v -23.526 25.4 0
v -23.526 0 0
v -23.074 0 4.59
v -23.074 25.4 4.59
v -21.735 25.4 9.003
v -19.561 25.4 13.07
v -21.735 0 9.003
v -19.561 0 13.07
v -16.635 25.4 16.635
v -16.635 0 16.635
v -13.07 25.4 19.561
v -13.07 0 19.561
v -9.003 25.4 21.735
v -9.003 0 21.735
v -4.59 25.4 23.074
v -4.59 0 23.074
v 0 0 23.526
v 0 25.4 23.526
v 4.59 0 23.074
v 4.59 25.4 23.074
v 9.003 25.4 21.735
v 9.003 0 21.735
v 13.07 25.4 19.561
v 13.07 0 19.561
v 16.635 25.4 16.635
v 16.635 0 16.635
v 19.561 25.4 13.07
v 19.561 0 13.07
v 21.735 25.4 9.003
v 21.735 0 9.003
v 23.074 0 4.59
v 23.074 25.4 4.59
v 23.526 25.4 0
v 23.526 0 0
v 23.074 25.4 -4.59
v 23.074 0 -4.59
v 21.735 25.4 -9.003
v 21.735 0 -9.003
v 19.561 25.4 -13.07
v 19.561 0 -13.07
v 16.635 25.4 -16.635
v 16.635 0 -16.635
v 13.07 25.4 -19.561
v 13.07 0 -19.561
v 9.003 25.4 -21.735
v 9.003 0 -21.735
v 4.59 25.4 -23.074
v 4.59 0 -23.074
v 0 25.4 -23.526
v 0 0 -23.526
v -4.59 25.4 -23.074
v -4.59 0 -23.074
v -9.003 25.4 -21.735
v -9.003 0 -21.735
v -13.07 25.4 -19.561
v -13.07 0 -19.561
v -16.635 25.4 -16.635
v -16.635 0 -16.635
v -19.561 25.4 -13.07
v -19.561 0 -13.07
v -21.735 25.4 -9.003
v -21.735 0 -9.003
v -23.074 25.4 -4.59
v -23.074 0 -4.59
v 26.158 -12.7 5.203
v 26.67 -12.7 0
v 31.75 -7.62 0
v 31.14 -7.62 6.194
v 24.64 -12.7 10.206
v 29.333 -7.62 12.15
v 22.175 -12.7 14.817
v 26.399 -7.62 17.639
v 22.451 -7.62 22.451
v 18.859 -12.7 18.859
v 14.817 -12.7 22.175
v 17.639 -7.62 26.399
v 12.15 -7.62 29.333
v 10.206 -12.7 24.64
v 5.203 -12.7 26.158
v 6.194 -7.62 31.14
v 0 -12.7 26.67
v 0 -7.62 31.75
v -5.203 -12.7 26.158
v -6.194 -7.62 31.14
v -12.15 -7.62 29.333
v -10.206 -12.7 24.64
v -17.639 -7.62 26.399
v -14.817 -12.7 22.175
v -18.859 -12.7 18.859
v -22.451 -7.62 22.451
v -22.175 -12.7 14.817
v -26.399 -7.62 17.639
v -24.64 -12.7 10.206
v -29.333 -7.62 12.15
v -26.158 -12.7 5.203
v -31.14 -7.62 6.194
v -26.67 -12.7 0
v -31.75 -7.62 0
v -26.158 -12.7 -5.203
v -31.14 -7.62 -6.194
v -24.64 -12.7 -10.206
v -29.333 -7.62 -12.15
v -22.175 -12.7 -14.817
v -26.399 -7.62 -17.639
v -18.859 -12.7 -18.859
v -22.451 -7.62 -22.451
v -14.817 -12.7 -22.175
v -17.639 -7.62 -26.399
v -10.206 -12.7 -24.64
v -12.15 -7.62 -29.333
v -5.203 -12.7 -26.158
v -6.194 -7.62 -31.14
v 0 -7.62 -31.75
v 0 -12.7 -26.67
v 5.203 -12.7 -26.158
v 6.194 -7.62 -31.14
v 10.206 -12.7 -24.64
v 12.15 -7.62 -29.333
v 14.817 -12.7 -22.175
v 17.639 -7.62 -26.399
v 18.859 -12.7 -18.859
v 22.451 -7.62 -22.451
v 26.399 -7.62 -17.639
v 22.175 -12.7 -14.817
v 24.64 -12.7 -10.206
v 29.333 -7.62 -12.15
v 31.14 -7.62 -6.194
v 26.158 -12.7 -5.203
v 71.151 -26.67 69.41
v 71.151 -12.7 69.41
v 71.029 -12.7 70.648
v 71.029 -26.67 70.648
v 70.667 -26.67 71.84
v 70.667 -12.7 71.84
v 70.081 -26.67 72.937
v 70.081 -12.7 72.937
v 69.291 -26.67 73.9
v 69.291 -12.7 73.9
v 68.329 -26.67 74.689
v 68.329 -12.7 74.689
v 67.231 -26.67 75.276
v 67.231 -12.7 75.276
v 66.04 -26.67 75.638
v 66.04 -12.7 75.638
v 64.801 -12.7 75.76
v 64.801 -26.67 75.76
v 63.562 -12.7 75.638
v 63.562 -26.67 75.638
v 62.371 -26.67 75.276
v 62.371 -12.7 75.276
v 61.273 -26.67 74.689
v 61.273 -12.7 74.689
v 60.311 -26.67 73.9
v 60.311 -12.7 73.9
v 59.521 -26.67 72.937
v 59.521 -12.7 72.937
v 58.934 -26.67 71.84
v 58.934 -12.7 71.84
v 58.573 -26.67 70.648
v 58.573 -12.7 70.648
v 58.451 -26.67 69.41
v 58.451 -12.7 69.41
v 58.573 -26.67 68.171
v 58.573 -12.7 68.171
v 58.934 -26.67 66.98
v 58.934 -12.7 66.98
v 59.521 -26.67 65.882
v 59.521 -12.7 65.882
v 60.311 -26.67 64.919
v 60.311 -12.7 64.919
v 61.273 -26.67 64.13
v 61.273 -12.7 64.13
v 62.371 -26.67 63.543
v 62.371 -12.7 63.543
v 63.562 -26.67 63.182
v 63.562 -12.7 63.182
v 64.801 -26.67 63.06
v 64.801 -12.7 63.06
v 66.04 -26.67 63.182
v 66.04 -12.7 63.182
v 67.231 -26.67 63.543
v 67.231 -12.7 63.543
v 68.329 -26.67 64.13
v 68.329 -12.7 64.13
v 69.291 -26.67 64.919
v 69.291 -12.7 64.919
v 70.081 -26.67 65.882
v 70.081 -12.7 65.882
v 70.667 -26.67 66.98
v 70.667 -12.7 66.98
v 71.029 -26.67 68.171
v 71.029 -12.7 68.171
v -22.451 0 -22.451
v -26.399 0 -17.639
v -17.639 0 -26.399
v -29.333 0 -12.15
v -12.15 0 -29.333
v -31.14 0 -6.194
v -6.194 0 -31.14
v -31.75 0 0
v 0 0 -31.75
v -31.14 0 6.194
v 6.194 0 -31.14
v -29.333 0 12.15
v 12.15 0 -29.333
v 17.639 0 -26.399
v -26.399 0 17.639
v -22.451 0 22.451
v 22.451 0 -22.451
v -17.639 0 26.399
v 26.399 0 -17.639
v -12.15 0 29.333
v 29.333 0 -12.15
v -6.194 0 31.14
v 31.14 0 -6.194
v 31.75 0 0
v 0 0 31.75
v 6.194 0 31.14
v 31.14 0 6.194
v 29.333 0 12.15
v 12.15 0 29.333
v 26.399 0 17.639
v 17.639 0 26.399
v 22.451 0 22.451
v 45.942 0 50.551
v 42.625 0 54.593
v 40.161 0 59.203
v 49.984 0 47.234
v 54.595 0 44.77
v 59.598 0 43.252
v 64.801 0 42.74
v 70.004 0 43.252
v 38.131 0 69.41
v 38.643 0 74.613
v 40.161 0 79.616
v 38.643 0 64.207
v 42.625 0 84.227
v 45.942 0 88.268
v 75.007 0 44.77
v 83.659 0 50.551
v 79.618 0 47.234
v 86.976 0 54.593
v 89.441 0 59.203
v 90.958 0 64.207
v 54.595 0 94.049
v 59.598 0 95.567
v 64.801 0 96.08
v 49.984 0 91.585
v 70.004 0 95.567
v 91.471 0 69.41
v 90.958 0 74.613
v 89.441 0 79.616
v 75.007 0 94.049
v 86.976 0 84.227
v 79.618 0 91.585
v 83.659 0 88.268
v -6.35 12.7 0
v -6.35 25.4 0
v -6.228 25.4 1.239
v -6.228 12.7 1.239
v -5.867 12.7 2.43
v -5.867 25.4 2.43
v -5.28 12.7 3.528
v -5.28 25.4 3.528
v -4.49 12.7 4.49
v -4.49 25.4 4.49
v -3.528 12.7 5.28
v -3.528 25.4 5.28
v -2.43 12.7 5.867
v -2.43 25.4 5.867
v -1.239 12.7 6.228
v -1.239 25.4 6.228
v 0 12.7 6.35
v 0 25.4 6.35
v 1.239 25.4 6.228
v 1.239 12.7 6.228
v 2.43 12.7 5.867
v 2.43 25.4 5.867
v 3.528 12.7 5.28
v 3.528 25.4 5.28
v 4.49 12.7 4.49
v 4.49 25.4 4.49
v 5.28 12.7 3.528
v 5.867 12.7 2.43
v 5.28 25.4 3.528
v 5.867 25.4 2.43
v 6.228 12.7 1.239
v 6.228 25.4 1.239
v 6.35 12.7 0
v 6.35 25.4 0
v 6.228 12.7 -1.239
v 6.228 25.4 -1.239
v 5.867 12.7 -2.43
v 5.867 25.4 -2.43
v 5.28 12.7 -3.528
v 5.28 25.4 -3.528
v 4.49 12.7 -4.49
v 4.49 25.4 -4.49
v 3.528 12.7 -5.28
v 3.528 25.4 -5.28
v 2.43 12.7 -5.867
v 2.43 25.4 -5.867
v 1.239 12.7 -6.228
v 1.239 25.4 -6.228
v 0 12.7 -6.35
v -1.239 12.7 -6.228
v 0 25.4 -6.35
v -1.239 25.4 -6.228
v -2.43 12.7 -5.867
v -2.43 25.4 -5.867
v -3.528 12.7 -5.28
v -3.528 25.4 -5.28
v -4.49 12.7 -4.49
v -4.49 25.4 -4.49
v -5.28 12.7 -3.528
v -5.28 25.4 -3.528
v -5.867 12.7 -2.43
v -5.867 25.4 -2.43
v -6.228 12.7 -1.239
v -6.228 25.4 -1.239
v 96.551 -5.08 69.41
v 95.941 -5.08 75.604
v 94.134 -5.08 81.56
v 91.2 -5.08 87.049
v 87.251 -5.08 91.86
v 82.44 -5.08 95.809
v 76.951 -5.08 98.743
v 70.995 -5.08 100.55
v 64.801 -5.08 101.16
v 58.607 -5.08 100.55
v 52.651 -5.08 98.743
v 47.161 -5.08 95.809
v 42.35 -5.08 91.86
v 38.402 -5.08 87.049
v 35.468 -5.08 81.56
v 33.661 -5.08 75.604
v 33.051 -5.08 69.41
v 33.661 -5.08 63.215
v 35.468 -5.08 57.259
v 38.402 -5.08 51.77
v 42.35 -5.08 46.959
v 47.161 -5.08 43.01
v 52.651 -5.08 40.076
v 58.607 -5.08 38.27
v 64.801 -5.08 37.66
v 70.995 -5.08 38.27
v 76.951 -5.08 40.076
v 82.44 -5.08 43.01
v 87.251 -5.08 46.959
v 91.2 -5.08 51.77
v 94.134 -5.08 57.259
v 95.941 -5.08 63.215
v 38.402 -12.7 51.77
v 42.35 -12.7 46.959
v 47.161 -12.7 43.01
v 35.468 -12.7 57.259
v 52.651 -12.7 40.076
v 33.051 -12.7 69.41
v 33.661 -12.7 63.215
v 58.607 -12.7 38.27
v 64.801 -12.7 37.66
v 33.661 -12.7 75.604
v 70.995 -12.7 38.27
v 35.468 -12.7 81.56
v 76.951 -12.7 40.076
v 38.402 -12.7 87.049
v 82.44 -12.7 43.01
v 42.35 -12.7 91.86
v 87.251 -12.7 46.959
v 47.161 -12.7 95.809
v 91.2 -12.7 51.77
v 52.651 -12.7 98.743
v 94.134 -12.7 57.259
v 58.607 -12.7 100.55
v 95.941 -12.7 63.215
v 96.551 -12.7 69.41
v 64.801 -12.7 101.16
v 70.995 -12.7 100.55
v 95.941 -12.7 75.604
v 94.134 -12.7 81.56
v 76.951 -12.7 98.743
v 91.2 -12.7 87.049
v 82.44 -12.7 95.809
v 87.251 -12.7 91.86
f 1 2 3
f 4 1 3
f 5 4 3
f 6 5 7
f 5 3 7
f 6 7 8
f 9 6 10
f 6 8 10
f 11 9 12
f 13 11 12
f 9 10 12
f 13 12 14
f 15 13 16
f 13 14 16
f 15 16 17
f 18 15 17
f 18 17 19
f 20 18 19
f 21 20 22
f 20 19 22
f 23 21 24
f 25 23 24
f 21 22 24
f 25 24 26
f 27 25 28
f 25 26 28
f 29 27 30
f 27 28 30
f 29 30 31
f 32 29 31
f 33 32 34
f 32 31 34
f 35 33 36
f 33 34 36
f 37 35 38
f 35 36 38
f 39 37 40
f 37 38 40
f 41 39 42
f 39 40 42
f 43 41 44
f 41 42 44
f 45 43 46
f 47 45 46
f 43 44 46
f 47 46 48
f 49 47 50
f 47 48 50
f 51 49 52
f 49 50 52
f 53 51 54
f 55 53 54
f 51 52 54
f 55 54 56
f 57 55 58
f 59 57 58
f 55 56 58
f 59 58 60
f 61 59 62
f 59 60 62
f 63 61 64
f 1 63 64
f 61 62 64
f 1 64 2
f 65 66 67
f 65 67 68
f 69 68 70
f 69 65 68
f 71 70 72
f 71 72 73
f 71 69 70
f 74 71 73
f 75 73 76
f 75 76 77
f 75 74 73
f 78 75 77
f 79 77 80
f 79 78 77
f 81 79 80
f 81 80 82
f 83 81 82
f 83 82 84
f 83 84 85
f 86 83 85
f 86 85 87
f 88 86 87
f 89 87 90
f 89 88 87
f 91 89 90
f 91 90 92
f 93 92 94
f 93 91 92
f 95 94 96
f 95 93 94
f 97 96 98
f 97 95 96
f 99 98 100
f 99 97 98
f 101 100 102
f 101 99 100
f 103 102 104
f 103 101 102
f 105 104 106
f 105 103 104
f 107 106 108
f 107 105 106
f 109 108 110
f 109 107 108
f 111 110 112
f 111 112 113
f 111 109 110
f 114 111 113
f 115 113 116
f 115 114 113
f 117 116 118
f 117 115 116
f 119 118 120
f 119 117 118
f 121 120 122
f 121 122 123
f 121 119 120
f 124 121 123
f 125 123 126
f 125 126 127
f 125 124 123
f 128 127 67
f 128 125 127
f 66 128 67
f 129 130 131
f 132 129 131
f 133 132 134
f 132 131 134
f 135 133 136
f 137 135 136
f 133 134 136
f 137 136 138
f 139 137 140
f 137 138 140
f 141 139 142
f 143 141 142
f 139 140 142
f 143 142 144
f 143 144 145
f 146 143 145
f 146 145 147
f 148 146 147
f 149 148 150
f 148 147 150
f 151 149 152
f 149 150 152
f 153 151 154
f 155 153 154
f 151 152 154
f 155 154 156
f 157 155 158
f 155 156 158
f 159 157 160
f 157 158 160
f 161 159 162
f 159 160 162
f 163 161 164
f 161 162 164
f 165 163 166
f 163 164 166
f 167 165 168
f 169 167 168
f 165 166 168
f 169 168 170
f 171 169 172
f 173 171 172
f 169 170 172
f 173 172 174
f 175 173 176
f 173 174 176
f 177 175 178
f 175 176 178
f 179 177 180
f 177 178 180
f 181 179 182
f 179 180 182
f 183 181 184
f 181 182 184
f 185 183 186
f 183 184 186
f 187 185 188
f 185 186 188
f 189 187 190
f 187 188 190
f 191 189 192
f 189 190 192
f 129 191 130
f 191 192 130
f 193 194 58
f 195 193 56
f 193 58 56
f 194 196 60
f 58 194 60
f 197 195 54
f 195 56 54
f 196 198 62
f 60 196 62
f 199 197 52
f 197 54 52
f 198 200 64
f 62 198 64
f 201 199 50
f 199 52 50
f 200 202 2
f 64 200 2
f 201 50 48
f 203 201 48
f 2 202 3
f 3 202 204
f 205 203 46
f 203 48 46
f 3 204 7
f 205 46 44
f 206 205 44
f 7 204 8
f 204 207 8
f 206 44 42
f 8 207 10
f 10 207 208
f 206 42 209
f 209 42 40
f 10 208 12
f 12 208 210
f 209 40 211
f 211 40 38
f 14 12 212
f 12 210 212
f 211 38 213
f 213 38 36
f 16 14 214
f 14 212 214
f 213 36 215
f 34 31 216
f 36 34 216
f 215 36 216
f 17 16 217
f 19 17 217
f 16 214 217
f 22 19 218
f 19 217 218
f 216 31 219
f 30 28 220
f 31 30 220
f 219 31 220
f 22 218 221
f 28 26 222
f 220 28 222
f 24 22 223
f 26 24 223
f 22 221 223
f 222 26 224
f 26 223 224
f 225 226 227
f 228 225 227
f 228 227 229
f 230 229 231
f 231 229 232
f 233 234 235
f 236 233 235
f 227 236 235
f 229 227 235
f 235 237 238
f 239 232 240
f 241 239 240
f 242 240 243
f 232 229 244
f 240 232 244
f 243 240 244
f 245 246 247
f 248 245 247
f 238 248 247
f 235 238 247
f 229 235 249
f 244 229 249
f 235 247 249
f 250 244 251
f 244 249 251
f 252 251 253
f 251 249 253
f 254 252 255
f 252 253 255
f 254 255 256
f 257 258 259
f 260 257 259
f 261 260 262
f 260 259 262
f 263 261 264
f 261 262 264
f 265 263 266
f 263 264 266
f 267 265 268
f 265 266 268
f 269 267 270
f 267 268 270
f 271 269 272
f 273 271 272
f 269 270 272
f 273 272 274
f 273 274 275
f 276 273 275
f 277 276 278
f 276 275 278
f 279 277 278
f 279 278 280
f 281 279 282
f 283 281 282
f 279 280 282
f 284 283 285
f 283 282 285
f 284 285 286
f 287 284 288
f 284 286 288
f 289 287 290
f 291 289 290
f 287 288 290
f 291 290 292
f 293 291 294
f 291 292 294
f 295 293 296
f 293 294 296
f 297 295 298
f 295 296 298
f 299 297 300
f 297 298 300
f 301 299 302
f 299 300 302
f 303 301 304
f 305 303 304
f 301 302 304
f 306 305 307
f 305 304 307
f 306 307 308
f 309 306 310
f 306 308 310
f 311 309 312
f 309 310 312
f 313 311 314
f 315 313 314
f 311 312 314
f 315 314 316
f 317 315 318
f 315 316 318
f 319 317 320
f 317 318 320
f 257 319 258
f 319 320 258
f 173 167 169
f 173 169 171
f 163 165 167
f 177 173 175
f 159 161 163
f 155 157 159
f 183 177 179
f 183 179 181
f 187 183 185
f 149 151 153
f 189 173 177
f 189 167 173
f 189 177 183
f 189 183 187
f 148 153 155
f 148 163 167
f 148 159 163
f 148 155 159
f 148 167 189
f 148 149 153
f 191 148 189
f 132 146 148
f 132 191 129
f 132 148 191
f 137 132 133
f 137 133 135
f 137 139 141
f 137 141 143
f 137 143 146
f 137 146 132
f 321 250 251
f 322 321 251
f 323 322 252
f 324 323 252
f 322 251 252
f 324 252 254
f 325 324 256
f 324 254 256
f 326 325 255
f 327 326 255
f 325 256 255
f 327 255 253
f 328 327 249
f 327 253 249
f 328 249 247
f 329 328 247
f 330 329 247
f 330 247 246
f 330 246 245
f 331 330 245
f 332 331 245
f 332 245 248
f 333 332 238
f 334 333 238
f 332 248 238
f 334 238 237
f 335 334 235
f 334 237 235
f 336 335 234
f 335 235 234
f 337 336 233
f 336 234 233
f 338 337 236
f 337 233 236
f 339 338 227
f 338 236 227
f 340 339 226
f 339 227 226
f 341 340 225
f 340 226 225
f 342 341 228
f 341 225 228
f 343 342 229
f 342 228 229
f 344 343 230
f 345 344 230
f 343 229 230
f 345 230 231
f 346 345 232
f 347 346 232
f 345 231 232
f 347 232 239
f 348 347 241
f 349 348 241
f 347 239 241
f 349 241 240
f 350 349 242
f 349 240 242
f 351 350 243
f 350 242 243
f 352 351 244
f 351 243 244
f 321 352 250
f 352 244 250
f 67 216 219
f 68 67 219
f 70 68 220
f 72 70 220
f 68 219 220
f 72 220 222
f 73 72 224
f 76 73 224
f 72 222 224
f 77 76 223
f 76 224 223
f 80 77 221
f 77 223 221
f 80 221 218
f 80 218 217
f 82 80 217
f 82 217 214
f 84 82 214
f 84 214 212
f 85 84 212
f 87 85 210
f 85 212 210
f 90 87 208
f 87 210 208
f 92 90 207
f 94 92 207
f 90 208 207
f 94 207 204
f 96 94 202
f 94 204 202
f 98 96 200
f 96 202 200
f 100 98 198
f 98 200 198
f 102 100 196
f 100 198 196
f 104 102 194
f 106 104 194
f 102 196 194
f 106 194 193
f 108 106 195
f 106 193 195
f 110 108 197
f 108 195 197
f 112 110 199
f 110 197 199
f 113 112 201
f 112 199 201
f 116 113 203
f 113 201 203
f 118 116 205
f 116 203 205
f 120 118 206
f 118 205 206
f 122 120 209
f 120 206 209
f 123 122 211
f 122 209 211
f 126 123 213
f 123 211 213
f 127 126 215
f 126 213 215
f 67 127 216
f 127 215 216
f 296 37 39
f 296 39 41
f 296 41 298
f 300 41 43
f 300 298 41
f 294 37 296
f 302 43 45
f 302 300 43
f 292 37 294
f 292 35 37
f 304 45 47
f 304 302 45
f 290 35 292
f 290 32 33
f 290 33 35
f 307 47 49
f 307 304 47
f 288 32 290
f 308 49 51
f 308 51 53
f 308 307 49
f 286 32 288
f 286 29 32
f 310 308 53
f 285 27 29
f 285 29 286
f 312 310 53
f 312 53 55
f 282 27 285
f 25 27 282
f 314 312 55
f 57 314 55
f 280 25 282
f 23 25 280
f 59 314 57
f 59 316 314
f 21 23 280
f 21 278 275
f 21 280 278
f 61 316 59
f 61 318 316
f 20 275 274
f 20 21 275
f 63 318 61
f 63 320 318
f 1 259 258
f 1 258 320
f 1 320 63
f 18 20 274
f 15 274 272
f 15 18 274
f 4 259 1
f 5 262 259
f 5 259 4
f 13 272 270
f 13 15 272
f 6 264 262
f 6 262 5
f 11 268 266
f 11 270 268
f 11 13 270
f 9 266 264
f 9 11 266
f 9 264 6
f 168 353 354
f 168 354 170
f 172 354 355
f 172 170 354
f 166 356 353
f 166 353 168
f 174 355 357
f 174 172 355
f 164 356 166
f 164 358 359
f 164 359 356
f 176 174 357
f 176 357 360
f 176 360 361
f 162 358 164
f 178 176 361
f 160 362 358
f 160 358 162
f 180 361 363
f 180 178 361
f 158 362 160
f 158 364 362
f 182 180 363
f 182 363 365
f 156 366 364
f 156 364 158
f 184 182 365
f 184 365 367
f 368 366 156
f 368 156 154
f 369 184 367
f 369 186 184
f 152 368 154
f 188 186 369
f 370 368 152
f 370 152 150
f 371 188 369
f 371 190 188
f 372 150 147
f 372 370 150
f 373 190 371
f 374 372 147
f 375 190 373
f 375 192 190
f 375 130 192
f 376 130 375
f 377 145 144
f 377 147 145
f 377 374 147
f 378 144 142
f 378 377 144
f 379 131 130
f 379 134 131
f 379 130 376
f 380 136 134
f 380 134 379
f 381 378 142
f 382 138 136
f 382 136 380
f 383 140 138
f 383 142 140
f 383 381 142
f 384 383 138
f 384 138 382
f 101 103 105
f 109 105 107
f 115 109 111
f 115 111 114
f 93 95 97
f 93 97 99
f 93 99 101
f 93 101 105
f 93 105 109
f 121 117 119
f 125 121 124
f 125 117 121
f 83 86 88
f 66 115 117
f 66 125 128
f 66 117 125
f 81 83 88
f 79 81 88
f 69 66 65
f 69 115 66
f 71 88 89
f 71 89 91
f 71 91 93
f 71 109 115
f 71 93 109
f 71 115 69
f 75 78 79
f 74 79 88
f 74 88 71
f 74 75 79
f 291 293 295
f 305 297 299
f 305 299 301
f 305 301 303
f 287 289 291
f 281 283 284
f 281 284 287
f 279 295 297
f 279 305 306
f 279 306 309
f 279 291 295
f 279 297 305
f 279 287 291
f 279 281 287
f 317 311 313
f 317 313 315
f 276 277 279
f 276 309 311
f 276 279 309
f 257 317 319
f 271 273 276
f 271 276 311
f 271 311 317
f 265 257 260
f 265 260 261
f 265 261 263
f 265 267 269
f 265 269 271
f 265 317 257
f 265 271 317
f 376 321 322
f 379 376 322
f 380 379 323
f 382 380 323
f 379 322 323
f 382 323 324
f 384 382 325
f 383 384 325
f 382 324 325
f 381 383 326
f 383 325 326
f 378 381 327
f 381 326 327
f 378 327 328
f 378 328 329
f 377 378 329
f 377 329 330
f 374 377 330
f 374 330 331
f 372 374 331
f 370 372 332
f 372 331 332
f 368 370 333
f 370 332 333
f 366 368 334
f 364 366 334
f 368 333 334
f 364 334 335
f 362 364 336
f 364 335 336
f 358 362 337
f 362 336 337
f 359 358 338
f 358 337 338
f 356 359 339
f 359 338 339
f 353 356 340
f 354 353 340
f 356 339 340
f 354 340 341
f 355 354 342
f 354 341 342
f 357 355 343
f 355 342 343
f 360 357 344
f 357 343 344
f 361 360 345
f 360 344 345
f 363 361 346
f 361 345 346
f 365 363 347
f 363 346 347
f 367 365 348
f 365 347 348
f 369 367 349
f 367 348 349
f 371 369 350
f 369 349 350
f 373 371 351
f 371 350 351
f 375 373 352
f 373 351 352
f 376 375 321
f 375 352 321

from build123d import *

# Parameters (mm, degrees)
F0_R       = 31.75
F1_DEPTH   = 12.7
F2_R       = 23.525721
F3_DEPTH   = 25.4
F4_R       = 6.35
F5_DEPTH   = 12.7
F6_R       = 31.75
F7_DEPTH   = 12.7
F8_R       = 6.35
F9_DEPTH   = 13.97
F10_SIZE   = 5.08
F10_2_SIZE = 5.08


with BuildPart() as f1:
    # F0 (on Front) → F1 (new body)
    with BuildSketch(Plane.XZ):
        Circle(F0_R)
    extrude(amount=F1_DEPTH)

    # F2 (on face) → F3 (join)
    with BuildSketch(Plane(origin=(0, 0, 0), x_dir=(-1, 0, 0), z_dir=(0, 1, 0))):
        Circle(F2_R)
    extrude(amount=F3_DEPTH)

    # F4 (on face) → F5 (cut)
    with BuildSketch(Plane(origin=(0, 25.4, 0), x_dir=(-1, 0, 0), z_dir=(0, 1, 0))):
        Circle(F4_R)
    extrude(amount=-F5_DEPTH, mode=Mode.SUBTRACT)

    # F10
    f10_edges = [f1.edges().sort_by_distance(p)[0] for p in [
        (-31.75, -12.7, 0),
    ]]
    chamfer(f10_edges, length=F10_SIZE)


with BuildPart() as f7:
    # F6 (on Front) → F7 (new body)
    with BuildSketch(Plane.XZ):
        with Locations((64.800724, 69.409594)):
            Circle(F6_R)
    extrude(amount=F7_DEPTH)

    # F8 (on face) → F9 (join)
    with BuildSketch(Plane.XZ.offset(12.7)):
        with Locations((64.800724, 69.409594)):
            Circle(F8_R)
    extrude(amount=F9_DEPTH)

    # F10#2
    f10_2_edges = [f7.edges().sort_by_distance(p)[0] for p in [
        (33.050724, 0, 69.409594),
    ]]
    chamfer(f10_2_edges, length=F10_2_SIZE)


solid = Compound([f1.part, f7.part])
